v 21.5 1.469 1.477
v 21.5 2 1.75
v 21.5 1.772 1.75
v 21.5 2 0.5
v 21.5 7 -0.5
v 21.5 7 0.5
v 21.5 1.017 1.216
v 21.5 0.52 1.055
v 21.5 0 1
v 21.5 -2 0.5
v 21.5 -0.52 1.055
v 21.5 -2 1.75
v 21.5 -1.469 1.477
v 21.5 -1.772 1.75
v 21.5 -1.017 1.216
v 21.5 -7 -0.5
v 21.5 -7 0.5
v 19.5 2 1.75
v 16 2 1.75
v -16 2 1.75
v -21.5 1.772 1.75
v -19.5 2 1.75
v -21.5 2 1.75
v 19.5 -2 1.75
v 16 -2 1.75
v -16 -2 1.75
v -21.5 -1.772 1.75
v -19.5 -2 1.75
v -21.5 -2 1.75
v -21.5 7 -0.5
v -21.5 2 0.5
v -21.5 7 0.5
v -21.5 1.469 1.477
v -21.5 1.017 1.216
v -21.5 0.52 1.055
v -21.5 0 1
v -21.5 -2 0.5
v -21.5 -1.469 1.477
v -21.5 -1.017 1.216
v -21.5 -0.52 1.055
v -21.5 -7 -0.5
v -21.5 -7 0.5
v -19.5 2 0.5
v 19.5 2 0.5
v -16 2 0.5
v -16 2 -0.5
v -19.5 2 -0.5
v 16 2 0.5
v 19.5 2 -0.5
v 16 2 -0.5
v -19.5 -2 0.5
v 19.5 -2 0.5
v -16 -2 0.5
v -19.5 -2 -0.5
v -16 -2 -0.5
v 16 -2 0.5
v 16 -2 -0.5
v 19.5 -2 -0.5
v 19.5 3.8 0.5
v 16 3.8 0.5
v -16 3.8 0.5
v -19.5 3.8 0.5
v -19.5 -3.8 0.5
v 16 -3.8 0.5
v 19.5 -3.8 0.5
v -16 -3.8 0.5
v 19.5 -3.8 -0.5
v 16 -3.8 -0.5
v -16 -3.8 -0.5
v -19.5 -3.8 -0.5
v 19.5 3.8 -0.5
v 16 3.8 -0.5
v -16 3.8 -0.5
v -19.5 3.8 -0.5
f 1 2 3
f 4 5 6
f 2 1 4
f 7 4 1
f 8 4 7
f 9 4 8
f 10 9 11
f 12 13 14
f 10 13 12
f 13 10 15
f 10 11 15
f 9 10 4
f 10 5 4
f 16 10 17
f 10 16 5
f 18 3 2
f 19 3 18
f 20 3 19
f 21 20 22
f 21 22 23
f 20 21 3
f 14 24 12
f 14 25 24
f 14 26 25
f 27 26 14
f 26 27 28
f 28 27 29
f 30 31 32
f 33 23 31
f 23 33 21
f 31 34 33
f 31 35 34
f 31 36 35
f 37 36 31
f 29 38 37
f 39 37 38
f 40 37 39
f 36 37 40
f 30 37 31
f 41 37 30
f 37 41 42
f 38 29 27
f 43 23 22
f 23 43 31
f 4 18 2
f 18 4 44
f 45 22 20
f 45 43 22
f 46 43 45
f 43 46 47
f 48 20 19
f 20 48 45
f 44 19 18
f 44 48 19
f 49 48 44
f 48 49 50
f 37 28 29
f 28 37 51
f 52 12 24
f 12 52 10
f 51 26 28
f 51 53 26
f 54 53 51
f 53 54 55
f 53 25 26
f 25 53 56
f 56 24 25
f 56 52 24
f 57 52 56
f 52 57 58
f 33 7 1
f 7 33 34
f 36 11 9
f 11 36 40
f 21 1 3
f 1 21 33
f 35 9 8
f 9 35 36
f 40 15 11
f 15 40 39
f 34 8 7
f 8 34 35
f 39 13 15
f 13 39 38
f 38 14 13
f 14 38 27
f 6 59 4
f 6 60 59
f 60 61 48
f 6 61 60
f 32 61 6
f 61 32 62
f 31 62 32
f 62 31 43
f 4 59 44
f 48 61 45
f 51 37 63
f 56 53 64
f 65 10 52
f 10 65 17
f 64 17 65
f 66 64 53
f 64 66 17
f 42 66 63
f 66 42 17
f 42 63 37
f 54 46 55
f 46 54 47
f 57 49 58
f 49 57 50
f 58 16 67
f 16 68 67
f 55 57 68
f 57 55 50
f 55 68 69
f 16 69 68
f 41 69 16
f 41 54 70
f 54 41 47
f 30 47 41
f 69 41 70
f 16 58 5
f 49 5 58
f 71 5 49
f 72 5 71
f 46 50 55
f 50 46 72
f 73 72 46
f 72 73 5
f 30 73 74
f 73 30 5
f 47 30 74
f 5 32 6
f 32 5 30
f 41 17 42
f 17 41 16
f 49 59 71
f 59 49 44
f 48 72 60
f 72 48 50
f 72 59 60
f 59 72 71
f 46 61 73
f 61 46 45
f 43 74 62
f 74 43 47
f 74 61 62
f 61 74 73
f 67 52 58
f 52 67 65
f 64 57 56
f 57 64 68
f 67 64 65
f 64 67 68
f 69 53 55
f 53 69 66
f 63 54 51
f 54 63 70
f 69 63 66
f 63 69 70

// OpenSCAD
//Width of the label area
labelWidth = 12; //[6,9,12,18]
//Length of the label area
labelLength = 30; //[10:100]
//Diameter of your cable
cableDiameter = 5; //[3:1:10]
//Cable tie type
cableTieW = 2.5; //[2.5:T18, 3.5:T30, 4.6:T50]

/* [Advanced] */
//Cable tie thickness
cableTieT = 1.3;
//Spacing between label area and cable tie hole
innerMargin = 1;
//Spacing between cable tie hole and outer edge
outerMargin = 2;

/* [Hidden] */
//Calculated variables
cableTieHoleW = cableTieW + 1;
cableTieHoleT = cableTieT + 0.5;
totalLength = labelLength + (innerMargin*2) + (outerMargin*2) + (cableTieHoleW*2);

cableTieHoleX = (labelLength/2)+(cableTieHoleW/2)+innerMargin;
cableTieHoleY = (cableDiameter*0.4)+(cableTieHoleT/2);

$fn=30;

difference(){
union(){
if (((cableDiameter*0.8)+(cableTieHoleT*2)) > labelWidth) {
    totalWidth = (cableDiameter*0.8)+(cableTieHoleT*2)+2;
    cube([totalLength, totalWidth, 1], center=true);
} else {
    totalWidth = labelWidth + 2;
    cube([totalLength, totalWidth, 1], center=true);
}
translate([0,0,1]) {
    difference(){
        cube([totalLength, cableDiameter*0.8, cableDiameter*0.3], center=true);
        translate([0,0,cableDiameter/2]) {
            rotate([0,90,0]) {
                cylinder(h=totalLength+1, d= cableDiameter, center=true);
            }
        }
    }
}
}
union(){
translate([cableTieHoleX,cableTieHoleY,0]) {
cube([cableTieHoleW, cableTieHoleT, 10], center=true);
}
translate([-1*cableTieHoleX,cableTieHoleY,0]) {
cube([cableTieHoleW, cableTieHoleT, 10], center=true);
}
translate([cableTieHoleX,-1*cableTieHoleY,0]) {
cube([cableTieHoleW, cableTieHoleT, 10], center=true);
}
translate([-1*cableTieHoleX,-1*cableTieHoleY,0]) {
cube([cableTieHoleW, cableTieHoleT, 10], center=true);
}
}
}
